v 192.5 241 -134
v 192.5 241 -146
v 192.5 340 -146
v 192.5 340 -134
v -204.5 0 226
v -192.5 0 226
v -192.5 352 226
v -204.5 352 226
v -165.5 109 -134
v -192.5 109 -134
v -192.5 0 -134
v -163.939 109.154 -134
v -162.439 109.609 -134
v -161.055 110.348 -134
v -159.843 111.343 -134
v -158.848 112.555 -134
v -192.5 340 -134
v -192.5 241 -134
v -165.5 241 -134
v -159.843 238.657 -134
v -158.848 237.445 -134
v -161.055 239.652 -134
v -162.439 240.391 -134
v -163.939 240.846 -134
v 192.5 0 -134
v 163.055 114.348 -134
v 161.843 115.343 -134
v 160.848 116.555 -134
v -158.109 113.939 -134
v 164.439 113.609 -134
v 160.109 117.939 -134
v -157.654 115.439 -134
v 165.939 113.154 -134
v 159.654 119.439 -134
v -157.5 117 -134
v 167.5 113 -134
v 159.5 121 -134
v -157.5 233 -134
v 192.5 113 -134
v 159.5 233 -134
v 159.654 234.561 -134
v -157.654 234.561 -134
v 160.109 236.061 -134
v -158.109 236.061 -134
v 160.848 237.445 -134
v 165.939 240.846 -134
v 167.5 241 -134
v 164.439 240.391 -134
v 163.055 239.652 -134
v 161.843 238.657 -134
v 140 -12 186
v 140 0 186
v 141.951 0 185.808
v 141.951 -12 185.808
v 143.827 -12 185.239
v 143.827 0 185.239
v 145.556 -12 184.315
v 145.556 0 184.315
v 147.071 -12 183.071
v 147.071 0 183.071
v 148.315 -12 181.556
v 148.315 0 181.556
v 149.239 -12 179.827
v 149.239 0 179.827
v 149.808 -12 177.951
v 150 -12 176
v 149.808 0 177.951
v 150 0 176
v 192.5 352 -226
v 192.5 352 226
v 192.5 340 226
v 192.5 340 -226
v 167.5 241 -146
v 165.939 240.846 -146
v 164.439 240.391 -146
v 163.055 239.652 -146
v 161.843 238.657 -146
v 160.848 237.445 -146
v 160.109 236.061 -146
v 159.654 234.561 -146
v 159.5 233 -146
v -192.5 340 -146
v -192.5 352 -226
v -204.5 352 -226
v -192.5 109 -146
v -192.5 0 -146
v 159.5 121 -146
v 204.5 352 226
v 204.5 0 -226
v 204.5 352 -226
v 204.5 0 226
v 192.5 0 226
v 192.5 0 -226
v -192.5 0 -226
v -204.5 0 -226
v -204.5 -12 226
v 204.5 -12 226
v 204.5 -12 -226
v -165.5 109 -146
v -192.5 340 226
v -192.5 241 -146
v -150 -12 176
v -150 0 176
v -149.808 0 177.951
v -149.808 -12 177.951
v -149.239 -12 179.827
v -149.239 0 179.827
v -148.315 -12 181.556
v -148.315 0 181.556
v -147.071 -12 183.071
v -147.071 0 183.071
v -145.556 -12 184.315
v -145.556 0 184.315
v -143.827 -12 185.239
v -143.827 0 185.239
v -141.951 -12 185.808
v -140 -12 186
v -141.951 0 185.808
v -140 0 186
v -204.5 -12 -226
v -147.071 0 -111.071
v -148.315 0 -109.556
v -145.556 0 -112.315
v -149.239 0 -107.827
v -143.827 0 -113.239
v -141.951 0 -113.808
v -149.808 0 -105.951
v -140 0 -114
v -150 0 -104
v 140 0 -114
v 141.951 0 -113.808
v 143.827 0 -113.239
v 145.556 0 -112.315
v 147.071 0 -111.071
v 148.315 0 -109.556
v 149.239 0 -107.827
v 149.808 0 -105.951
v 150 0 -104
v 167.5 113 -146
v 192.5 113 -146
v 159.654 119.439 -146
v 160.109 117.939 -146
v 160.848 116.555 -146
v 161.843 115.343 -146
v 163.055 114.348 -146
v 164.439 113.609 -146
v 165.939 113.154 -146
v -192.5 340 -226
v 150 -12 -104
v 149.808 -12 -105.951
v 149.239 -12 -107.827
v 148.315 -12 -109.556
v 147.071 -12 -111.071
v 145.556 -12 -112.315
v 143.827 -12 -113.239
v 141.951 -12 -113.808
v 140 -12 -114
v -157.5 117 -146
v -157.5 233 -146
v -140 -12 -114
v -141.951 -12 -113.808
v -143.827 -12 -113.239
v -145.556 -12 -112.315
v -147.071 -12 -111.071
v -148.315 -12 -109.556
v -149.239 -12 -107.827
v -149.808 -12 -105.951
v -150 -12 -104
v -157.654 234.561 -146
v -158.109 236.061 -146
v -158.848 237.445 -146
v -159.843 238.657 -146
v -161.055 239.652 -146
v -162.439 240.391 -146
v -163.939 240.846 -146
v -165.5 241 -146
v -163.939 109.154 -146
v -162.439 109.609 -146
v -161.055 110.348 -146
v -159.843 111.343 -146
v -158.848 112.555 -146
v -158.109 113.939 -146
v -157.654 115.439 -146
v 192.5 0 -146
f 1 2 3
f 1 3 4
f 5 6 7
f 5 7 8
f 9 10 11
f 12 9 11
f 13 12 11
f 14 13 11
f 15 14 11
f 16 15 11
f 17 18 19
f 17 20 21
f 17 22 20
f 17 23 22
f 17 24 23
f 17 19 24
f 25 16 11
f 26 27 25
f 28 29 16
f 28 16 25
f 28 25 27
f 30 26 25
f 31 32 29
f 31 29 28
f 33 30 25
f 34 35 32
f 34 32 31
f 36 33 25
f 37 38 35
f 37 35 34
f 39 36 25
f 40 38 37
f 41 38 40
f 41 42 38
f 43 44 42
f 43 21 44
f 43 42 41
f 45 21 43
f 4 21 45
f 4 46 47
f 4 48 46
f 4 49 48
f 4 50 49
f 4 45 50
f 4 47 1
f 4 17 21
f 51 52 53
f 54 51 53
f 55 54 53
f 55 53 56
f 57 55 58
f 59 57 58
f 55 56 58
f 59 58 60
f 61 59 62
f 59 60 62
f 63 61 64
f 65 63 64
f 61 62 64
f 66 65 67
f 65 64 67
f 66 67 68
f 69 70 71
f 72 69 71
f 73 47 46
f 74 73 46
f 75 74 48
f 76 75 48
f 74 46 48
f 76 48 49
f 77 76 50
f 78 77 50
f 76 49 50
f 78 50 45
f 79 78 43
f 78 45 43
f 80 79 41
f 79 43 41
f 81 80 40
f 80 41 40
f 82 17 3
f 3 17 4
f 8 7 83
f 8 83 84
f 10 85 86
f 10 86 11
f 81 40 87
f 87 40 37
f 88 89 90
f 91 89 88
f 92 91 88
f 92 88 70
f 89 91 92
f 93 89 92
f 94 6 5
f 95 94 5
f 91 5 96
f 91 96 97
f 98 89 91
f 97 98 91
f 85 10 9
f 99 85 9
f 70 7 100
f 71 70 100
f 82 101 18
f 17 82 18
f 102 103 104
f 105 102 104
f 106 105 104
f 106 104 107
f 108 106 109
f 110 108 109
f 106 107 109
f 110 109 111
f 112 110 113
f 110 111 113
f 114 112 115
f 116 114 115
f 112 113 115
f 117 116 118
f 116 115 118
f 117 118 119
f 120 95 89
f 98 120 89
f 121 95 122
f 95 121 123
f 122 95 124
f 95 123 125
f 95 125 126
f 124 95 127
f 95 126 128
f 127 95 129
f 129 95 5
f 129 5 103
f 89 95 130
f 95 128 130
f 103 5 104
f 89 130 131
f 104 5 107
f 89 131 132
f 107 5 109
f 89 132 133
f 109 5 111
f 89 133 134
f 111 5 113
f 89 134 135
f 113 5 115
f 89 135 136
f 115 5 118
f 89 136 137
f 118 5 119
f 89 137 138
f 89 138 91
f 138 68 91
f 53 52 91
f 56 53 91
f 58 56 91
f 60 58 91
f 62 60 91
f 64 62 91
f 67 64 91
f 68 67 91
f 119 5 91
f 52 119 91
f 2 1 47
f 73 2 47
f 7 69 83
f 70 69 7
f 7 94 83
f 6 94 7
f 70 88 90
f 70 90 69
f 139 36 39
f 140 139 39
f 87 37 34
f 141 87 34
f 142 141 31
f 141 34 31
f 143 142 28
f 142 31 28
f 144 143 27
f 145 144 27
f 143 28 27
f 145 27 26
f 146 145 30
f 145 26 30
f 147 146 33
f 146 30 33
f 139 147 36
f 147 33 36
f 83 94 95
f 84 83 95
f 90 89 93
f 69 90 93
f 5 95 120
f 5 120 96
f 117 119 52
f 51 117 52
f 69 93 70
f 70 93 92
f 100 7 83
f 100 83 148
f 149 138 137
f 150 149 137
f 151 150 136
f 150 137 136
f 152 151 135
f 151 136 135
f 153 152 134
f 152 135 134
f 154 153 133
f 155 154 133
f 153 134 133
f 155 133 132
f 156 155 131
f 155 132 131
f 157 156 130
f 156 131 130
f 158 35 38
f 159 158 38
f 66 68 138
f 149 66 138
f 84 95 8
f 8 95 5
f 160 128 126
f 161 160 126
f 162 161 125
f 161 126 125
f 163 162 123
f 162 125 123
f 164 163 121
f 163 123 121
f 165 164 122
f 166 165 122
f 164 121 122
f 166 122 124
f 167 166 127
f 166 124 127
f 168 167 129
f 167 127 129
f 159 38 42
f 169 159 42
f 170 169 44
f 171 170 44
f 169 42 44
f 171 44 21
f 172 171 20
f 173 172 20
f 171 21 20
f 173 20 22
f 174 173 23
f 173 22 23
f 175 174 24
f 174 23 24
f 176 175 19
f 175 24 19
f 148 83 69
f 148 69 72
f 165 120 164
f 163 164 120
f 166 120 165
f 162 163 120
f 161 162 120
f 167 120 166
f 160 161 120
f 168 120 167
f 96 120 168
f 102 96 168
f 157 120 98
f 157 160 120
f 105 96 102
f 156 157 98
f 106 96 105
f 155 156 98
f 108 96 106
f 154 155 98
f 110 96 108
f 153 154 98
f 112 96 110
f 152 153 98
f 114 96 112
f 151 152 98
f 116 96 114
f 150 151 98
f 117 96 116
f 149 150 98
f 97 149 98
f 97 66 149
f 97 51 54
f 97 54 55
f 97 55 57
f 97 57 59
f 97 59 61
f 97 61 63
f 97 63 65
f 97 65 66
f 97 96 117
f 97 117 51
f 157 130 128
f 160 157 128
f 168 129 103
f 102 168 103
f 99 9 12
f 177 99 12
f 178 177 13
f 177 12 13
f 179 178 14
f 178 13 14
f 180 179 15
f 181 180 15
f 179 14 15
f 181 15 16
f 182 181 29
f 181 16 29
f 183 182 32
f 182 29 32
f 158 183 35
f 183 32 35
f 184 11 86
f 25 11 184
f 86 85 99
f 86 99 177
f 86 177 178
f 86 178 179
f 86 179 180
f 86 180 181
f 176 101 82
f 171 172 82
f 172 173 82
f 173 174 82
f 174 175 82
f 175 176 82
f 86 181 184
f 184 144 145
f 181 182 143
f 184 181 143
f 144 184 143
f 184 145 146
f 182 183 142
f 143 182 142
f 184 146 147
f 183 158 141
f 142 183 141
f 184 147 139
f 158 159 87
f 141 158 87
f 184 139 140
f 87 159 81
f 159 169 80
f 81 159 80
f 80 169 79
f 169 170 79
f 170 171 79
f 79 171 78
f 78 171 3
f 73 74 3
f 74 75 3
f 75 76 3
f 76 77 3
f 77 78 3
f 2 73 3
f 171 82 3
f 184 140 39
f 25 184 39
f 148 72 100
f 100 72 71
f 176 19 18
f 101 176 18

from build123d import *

# Parameters (mm, degrees)
F0_W     = 409
F0_H     = 452
F1_DEPTH = 12
F2_W     = 12
F2_H     = 452
F3_DEPTH = 352
F4_W     = 12
F4_H     = 452
F5_DEPTH = 385
F6_W     = 385
F6_H     = 12
F7_DEPTH = 340
F9_DEPTH = 92.001


with BuildPart() as f1:
    # F0 (on Front) → F1 (new body)
    with BuildSketch(Plane.XZ):
        Rectangle(F0_W, F0_H)
        with BuildLine():
            ThreePointArc((150, -104), (147.071068, -111.071068), (140, -114))
            Line((140, -114), (-140, -114))
            ThreePointArc((-140, -114), (-147.071068, -111.071068), (-150, -104))
            Line((-150, -104), (-150, 176))
            ThreePointArc((-150, 176), (-147.071068, 183.071068), (-140, 186))
            Line((-140, 186), (140, 186))
            ThreePointArc((140, 186), (147.071068, 183.071068), (150, 176))
            Line((150, 176), (150, -104))
        make_face(mode=Mode.SUBTRACT)
    extrude(amount=F1_DEPTH)


with BuildPart() as f3:
    # F2 (on face) → F3 (new body)
    with BuildSketch(Plane(origin=(0, 0, 0), x_dir=(-1, 0, 0), z_dir=(0, 1, 0))):
        with Locations((-198.5, 0)):
            Rectangle(F2_W, F2_H)
        with Locations((198.5, 0)):
            Rectangle(F2_W, F2_H)
    extrude(amount=F3_DEPTH)


with BuildPart() as f5:
    # F4 (on face) → F5 (new body, through all)
    with BuildSketch(Plane(origin=(192.5, 0, 0), x_dir=(0, -1, 0), z_dir=(-1, 0, 0))):
        with Locations((-346, 0)):
            Rectangle(F4_W, F4_H)
    extrude(amount=F5_DEPTH)


with BuildPart() as f7:
    # F6 (on face) → F7 (new body, through all)
    with BuildSketch(Plane.XZ.offset(-340)):
        with Locations((0, -140)):
            Rectangle(F6_W, F6_H)
    extrude(amount=F7_DEPTH)

    # F8 (on face) → F9 (cut, through all)
    with BuildSketch(Plane.XY.offset(-134)):
        with BuildLine():
            Line((-165.5, 241), (-192.5, 241))
            Line((-192.5, 241), (-192.5, 109))
            Line((-192.5, 109), (-165.5, 109))
            ThreePointArc((-165.5, 109), (-159.843146, 111.343146), (-157.5, 117))
            Line((-157.5, 117), (-157.5, 233))
            ThreePointArc((-157.5, 233), (-159.843146, 238.656854), (-165.5, 241))
        make_face()
        with BuildLine():
            Line((192.5, 113), (192.5, 241))
            Line((192.5, 241), (167.5, 241))
            ThreePointArc((167.5, 241), (161.843146, 238.656854), (159.5, 233))
            Line((159.5, 233), (159.5, 121))
            ThreePointArc((159.5, 121), (161.843146, 115.343146), (167.5, 113))
            Line((167.5, 113), (192.5, 113))
        make_face()
    extrude(amount=-F9_DEPTH, mode=Mode.SUBTRACT)


solid = Compound([f1.part, f3.part, f5.part, f7.part])
